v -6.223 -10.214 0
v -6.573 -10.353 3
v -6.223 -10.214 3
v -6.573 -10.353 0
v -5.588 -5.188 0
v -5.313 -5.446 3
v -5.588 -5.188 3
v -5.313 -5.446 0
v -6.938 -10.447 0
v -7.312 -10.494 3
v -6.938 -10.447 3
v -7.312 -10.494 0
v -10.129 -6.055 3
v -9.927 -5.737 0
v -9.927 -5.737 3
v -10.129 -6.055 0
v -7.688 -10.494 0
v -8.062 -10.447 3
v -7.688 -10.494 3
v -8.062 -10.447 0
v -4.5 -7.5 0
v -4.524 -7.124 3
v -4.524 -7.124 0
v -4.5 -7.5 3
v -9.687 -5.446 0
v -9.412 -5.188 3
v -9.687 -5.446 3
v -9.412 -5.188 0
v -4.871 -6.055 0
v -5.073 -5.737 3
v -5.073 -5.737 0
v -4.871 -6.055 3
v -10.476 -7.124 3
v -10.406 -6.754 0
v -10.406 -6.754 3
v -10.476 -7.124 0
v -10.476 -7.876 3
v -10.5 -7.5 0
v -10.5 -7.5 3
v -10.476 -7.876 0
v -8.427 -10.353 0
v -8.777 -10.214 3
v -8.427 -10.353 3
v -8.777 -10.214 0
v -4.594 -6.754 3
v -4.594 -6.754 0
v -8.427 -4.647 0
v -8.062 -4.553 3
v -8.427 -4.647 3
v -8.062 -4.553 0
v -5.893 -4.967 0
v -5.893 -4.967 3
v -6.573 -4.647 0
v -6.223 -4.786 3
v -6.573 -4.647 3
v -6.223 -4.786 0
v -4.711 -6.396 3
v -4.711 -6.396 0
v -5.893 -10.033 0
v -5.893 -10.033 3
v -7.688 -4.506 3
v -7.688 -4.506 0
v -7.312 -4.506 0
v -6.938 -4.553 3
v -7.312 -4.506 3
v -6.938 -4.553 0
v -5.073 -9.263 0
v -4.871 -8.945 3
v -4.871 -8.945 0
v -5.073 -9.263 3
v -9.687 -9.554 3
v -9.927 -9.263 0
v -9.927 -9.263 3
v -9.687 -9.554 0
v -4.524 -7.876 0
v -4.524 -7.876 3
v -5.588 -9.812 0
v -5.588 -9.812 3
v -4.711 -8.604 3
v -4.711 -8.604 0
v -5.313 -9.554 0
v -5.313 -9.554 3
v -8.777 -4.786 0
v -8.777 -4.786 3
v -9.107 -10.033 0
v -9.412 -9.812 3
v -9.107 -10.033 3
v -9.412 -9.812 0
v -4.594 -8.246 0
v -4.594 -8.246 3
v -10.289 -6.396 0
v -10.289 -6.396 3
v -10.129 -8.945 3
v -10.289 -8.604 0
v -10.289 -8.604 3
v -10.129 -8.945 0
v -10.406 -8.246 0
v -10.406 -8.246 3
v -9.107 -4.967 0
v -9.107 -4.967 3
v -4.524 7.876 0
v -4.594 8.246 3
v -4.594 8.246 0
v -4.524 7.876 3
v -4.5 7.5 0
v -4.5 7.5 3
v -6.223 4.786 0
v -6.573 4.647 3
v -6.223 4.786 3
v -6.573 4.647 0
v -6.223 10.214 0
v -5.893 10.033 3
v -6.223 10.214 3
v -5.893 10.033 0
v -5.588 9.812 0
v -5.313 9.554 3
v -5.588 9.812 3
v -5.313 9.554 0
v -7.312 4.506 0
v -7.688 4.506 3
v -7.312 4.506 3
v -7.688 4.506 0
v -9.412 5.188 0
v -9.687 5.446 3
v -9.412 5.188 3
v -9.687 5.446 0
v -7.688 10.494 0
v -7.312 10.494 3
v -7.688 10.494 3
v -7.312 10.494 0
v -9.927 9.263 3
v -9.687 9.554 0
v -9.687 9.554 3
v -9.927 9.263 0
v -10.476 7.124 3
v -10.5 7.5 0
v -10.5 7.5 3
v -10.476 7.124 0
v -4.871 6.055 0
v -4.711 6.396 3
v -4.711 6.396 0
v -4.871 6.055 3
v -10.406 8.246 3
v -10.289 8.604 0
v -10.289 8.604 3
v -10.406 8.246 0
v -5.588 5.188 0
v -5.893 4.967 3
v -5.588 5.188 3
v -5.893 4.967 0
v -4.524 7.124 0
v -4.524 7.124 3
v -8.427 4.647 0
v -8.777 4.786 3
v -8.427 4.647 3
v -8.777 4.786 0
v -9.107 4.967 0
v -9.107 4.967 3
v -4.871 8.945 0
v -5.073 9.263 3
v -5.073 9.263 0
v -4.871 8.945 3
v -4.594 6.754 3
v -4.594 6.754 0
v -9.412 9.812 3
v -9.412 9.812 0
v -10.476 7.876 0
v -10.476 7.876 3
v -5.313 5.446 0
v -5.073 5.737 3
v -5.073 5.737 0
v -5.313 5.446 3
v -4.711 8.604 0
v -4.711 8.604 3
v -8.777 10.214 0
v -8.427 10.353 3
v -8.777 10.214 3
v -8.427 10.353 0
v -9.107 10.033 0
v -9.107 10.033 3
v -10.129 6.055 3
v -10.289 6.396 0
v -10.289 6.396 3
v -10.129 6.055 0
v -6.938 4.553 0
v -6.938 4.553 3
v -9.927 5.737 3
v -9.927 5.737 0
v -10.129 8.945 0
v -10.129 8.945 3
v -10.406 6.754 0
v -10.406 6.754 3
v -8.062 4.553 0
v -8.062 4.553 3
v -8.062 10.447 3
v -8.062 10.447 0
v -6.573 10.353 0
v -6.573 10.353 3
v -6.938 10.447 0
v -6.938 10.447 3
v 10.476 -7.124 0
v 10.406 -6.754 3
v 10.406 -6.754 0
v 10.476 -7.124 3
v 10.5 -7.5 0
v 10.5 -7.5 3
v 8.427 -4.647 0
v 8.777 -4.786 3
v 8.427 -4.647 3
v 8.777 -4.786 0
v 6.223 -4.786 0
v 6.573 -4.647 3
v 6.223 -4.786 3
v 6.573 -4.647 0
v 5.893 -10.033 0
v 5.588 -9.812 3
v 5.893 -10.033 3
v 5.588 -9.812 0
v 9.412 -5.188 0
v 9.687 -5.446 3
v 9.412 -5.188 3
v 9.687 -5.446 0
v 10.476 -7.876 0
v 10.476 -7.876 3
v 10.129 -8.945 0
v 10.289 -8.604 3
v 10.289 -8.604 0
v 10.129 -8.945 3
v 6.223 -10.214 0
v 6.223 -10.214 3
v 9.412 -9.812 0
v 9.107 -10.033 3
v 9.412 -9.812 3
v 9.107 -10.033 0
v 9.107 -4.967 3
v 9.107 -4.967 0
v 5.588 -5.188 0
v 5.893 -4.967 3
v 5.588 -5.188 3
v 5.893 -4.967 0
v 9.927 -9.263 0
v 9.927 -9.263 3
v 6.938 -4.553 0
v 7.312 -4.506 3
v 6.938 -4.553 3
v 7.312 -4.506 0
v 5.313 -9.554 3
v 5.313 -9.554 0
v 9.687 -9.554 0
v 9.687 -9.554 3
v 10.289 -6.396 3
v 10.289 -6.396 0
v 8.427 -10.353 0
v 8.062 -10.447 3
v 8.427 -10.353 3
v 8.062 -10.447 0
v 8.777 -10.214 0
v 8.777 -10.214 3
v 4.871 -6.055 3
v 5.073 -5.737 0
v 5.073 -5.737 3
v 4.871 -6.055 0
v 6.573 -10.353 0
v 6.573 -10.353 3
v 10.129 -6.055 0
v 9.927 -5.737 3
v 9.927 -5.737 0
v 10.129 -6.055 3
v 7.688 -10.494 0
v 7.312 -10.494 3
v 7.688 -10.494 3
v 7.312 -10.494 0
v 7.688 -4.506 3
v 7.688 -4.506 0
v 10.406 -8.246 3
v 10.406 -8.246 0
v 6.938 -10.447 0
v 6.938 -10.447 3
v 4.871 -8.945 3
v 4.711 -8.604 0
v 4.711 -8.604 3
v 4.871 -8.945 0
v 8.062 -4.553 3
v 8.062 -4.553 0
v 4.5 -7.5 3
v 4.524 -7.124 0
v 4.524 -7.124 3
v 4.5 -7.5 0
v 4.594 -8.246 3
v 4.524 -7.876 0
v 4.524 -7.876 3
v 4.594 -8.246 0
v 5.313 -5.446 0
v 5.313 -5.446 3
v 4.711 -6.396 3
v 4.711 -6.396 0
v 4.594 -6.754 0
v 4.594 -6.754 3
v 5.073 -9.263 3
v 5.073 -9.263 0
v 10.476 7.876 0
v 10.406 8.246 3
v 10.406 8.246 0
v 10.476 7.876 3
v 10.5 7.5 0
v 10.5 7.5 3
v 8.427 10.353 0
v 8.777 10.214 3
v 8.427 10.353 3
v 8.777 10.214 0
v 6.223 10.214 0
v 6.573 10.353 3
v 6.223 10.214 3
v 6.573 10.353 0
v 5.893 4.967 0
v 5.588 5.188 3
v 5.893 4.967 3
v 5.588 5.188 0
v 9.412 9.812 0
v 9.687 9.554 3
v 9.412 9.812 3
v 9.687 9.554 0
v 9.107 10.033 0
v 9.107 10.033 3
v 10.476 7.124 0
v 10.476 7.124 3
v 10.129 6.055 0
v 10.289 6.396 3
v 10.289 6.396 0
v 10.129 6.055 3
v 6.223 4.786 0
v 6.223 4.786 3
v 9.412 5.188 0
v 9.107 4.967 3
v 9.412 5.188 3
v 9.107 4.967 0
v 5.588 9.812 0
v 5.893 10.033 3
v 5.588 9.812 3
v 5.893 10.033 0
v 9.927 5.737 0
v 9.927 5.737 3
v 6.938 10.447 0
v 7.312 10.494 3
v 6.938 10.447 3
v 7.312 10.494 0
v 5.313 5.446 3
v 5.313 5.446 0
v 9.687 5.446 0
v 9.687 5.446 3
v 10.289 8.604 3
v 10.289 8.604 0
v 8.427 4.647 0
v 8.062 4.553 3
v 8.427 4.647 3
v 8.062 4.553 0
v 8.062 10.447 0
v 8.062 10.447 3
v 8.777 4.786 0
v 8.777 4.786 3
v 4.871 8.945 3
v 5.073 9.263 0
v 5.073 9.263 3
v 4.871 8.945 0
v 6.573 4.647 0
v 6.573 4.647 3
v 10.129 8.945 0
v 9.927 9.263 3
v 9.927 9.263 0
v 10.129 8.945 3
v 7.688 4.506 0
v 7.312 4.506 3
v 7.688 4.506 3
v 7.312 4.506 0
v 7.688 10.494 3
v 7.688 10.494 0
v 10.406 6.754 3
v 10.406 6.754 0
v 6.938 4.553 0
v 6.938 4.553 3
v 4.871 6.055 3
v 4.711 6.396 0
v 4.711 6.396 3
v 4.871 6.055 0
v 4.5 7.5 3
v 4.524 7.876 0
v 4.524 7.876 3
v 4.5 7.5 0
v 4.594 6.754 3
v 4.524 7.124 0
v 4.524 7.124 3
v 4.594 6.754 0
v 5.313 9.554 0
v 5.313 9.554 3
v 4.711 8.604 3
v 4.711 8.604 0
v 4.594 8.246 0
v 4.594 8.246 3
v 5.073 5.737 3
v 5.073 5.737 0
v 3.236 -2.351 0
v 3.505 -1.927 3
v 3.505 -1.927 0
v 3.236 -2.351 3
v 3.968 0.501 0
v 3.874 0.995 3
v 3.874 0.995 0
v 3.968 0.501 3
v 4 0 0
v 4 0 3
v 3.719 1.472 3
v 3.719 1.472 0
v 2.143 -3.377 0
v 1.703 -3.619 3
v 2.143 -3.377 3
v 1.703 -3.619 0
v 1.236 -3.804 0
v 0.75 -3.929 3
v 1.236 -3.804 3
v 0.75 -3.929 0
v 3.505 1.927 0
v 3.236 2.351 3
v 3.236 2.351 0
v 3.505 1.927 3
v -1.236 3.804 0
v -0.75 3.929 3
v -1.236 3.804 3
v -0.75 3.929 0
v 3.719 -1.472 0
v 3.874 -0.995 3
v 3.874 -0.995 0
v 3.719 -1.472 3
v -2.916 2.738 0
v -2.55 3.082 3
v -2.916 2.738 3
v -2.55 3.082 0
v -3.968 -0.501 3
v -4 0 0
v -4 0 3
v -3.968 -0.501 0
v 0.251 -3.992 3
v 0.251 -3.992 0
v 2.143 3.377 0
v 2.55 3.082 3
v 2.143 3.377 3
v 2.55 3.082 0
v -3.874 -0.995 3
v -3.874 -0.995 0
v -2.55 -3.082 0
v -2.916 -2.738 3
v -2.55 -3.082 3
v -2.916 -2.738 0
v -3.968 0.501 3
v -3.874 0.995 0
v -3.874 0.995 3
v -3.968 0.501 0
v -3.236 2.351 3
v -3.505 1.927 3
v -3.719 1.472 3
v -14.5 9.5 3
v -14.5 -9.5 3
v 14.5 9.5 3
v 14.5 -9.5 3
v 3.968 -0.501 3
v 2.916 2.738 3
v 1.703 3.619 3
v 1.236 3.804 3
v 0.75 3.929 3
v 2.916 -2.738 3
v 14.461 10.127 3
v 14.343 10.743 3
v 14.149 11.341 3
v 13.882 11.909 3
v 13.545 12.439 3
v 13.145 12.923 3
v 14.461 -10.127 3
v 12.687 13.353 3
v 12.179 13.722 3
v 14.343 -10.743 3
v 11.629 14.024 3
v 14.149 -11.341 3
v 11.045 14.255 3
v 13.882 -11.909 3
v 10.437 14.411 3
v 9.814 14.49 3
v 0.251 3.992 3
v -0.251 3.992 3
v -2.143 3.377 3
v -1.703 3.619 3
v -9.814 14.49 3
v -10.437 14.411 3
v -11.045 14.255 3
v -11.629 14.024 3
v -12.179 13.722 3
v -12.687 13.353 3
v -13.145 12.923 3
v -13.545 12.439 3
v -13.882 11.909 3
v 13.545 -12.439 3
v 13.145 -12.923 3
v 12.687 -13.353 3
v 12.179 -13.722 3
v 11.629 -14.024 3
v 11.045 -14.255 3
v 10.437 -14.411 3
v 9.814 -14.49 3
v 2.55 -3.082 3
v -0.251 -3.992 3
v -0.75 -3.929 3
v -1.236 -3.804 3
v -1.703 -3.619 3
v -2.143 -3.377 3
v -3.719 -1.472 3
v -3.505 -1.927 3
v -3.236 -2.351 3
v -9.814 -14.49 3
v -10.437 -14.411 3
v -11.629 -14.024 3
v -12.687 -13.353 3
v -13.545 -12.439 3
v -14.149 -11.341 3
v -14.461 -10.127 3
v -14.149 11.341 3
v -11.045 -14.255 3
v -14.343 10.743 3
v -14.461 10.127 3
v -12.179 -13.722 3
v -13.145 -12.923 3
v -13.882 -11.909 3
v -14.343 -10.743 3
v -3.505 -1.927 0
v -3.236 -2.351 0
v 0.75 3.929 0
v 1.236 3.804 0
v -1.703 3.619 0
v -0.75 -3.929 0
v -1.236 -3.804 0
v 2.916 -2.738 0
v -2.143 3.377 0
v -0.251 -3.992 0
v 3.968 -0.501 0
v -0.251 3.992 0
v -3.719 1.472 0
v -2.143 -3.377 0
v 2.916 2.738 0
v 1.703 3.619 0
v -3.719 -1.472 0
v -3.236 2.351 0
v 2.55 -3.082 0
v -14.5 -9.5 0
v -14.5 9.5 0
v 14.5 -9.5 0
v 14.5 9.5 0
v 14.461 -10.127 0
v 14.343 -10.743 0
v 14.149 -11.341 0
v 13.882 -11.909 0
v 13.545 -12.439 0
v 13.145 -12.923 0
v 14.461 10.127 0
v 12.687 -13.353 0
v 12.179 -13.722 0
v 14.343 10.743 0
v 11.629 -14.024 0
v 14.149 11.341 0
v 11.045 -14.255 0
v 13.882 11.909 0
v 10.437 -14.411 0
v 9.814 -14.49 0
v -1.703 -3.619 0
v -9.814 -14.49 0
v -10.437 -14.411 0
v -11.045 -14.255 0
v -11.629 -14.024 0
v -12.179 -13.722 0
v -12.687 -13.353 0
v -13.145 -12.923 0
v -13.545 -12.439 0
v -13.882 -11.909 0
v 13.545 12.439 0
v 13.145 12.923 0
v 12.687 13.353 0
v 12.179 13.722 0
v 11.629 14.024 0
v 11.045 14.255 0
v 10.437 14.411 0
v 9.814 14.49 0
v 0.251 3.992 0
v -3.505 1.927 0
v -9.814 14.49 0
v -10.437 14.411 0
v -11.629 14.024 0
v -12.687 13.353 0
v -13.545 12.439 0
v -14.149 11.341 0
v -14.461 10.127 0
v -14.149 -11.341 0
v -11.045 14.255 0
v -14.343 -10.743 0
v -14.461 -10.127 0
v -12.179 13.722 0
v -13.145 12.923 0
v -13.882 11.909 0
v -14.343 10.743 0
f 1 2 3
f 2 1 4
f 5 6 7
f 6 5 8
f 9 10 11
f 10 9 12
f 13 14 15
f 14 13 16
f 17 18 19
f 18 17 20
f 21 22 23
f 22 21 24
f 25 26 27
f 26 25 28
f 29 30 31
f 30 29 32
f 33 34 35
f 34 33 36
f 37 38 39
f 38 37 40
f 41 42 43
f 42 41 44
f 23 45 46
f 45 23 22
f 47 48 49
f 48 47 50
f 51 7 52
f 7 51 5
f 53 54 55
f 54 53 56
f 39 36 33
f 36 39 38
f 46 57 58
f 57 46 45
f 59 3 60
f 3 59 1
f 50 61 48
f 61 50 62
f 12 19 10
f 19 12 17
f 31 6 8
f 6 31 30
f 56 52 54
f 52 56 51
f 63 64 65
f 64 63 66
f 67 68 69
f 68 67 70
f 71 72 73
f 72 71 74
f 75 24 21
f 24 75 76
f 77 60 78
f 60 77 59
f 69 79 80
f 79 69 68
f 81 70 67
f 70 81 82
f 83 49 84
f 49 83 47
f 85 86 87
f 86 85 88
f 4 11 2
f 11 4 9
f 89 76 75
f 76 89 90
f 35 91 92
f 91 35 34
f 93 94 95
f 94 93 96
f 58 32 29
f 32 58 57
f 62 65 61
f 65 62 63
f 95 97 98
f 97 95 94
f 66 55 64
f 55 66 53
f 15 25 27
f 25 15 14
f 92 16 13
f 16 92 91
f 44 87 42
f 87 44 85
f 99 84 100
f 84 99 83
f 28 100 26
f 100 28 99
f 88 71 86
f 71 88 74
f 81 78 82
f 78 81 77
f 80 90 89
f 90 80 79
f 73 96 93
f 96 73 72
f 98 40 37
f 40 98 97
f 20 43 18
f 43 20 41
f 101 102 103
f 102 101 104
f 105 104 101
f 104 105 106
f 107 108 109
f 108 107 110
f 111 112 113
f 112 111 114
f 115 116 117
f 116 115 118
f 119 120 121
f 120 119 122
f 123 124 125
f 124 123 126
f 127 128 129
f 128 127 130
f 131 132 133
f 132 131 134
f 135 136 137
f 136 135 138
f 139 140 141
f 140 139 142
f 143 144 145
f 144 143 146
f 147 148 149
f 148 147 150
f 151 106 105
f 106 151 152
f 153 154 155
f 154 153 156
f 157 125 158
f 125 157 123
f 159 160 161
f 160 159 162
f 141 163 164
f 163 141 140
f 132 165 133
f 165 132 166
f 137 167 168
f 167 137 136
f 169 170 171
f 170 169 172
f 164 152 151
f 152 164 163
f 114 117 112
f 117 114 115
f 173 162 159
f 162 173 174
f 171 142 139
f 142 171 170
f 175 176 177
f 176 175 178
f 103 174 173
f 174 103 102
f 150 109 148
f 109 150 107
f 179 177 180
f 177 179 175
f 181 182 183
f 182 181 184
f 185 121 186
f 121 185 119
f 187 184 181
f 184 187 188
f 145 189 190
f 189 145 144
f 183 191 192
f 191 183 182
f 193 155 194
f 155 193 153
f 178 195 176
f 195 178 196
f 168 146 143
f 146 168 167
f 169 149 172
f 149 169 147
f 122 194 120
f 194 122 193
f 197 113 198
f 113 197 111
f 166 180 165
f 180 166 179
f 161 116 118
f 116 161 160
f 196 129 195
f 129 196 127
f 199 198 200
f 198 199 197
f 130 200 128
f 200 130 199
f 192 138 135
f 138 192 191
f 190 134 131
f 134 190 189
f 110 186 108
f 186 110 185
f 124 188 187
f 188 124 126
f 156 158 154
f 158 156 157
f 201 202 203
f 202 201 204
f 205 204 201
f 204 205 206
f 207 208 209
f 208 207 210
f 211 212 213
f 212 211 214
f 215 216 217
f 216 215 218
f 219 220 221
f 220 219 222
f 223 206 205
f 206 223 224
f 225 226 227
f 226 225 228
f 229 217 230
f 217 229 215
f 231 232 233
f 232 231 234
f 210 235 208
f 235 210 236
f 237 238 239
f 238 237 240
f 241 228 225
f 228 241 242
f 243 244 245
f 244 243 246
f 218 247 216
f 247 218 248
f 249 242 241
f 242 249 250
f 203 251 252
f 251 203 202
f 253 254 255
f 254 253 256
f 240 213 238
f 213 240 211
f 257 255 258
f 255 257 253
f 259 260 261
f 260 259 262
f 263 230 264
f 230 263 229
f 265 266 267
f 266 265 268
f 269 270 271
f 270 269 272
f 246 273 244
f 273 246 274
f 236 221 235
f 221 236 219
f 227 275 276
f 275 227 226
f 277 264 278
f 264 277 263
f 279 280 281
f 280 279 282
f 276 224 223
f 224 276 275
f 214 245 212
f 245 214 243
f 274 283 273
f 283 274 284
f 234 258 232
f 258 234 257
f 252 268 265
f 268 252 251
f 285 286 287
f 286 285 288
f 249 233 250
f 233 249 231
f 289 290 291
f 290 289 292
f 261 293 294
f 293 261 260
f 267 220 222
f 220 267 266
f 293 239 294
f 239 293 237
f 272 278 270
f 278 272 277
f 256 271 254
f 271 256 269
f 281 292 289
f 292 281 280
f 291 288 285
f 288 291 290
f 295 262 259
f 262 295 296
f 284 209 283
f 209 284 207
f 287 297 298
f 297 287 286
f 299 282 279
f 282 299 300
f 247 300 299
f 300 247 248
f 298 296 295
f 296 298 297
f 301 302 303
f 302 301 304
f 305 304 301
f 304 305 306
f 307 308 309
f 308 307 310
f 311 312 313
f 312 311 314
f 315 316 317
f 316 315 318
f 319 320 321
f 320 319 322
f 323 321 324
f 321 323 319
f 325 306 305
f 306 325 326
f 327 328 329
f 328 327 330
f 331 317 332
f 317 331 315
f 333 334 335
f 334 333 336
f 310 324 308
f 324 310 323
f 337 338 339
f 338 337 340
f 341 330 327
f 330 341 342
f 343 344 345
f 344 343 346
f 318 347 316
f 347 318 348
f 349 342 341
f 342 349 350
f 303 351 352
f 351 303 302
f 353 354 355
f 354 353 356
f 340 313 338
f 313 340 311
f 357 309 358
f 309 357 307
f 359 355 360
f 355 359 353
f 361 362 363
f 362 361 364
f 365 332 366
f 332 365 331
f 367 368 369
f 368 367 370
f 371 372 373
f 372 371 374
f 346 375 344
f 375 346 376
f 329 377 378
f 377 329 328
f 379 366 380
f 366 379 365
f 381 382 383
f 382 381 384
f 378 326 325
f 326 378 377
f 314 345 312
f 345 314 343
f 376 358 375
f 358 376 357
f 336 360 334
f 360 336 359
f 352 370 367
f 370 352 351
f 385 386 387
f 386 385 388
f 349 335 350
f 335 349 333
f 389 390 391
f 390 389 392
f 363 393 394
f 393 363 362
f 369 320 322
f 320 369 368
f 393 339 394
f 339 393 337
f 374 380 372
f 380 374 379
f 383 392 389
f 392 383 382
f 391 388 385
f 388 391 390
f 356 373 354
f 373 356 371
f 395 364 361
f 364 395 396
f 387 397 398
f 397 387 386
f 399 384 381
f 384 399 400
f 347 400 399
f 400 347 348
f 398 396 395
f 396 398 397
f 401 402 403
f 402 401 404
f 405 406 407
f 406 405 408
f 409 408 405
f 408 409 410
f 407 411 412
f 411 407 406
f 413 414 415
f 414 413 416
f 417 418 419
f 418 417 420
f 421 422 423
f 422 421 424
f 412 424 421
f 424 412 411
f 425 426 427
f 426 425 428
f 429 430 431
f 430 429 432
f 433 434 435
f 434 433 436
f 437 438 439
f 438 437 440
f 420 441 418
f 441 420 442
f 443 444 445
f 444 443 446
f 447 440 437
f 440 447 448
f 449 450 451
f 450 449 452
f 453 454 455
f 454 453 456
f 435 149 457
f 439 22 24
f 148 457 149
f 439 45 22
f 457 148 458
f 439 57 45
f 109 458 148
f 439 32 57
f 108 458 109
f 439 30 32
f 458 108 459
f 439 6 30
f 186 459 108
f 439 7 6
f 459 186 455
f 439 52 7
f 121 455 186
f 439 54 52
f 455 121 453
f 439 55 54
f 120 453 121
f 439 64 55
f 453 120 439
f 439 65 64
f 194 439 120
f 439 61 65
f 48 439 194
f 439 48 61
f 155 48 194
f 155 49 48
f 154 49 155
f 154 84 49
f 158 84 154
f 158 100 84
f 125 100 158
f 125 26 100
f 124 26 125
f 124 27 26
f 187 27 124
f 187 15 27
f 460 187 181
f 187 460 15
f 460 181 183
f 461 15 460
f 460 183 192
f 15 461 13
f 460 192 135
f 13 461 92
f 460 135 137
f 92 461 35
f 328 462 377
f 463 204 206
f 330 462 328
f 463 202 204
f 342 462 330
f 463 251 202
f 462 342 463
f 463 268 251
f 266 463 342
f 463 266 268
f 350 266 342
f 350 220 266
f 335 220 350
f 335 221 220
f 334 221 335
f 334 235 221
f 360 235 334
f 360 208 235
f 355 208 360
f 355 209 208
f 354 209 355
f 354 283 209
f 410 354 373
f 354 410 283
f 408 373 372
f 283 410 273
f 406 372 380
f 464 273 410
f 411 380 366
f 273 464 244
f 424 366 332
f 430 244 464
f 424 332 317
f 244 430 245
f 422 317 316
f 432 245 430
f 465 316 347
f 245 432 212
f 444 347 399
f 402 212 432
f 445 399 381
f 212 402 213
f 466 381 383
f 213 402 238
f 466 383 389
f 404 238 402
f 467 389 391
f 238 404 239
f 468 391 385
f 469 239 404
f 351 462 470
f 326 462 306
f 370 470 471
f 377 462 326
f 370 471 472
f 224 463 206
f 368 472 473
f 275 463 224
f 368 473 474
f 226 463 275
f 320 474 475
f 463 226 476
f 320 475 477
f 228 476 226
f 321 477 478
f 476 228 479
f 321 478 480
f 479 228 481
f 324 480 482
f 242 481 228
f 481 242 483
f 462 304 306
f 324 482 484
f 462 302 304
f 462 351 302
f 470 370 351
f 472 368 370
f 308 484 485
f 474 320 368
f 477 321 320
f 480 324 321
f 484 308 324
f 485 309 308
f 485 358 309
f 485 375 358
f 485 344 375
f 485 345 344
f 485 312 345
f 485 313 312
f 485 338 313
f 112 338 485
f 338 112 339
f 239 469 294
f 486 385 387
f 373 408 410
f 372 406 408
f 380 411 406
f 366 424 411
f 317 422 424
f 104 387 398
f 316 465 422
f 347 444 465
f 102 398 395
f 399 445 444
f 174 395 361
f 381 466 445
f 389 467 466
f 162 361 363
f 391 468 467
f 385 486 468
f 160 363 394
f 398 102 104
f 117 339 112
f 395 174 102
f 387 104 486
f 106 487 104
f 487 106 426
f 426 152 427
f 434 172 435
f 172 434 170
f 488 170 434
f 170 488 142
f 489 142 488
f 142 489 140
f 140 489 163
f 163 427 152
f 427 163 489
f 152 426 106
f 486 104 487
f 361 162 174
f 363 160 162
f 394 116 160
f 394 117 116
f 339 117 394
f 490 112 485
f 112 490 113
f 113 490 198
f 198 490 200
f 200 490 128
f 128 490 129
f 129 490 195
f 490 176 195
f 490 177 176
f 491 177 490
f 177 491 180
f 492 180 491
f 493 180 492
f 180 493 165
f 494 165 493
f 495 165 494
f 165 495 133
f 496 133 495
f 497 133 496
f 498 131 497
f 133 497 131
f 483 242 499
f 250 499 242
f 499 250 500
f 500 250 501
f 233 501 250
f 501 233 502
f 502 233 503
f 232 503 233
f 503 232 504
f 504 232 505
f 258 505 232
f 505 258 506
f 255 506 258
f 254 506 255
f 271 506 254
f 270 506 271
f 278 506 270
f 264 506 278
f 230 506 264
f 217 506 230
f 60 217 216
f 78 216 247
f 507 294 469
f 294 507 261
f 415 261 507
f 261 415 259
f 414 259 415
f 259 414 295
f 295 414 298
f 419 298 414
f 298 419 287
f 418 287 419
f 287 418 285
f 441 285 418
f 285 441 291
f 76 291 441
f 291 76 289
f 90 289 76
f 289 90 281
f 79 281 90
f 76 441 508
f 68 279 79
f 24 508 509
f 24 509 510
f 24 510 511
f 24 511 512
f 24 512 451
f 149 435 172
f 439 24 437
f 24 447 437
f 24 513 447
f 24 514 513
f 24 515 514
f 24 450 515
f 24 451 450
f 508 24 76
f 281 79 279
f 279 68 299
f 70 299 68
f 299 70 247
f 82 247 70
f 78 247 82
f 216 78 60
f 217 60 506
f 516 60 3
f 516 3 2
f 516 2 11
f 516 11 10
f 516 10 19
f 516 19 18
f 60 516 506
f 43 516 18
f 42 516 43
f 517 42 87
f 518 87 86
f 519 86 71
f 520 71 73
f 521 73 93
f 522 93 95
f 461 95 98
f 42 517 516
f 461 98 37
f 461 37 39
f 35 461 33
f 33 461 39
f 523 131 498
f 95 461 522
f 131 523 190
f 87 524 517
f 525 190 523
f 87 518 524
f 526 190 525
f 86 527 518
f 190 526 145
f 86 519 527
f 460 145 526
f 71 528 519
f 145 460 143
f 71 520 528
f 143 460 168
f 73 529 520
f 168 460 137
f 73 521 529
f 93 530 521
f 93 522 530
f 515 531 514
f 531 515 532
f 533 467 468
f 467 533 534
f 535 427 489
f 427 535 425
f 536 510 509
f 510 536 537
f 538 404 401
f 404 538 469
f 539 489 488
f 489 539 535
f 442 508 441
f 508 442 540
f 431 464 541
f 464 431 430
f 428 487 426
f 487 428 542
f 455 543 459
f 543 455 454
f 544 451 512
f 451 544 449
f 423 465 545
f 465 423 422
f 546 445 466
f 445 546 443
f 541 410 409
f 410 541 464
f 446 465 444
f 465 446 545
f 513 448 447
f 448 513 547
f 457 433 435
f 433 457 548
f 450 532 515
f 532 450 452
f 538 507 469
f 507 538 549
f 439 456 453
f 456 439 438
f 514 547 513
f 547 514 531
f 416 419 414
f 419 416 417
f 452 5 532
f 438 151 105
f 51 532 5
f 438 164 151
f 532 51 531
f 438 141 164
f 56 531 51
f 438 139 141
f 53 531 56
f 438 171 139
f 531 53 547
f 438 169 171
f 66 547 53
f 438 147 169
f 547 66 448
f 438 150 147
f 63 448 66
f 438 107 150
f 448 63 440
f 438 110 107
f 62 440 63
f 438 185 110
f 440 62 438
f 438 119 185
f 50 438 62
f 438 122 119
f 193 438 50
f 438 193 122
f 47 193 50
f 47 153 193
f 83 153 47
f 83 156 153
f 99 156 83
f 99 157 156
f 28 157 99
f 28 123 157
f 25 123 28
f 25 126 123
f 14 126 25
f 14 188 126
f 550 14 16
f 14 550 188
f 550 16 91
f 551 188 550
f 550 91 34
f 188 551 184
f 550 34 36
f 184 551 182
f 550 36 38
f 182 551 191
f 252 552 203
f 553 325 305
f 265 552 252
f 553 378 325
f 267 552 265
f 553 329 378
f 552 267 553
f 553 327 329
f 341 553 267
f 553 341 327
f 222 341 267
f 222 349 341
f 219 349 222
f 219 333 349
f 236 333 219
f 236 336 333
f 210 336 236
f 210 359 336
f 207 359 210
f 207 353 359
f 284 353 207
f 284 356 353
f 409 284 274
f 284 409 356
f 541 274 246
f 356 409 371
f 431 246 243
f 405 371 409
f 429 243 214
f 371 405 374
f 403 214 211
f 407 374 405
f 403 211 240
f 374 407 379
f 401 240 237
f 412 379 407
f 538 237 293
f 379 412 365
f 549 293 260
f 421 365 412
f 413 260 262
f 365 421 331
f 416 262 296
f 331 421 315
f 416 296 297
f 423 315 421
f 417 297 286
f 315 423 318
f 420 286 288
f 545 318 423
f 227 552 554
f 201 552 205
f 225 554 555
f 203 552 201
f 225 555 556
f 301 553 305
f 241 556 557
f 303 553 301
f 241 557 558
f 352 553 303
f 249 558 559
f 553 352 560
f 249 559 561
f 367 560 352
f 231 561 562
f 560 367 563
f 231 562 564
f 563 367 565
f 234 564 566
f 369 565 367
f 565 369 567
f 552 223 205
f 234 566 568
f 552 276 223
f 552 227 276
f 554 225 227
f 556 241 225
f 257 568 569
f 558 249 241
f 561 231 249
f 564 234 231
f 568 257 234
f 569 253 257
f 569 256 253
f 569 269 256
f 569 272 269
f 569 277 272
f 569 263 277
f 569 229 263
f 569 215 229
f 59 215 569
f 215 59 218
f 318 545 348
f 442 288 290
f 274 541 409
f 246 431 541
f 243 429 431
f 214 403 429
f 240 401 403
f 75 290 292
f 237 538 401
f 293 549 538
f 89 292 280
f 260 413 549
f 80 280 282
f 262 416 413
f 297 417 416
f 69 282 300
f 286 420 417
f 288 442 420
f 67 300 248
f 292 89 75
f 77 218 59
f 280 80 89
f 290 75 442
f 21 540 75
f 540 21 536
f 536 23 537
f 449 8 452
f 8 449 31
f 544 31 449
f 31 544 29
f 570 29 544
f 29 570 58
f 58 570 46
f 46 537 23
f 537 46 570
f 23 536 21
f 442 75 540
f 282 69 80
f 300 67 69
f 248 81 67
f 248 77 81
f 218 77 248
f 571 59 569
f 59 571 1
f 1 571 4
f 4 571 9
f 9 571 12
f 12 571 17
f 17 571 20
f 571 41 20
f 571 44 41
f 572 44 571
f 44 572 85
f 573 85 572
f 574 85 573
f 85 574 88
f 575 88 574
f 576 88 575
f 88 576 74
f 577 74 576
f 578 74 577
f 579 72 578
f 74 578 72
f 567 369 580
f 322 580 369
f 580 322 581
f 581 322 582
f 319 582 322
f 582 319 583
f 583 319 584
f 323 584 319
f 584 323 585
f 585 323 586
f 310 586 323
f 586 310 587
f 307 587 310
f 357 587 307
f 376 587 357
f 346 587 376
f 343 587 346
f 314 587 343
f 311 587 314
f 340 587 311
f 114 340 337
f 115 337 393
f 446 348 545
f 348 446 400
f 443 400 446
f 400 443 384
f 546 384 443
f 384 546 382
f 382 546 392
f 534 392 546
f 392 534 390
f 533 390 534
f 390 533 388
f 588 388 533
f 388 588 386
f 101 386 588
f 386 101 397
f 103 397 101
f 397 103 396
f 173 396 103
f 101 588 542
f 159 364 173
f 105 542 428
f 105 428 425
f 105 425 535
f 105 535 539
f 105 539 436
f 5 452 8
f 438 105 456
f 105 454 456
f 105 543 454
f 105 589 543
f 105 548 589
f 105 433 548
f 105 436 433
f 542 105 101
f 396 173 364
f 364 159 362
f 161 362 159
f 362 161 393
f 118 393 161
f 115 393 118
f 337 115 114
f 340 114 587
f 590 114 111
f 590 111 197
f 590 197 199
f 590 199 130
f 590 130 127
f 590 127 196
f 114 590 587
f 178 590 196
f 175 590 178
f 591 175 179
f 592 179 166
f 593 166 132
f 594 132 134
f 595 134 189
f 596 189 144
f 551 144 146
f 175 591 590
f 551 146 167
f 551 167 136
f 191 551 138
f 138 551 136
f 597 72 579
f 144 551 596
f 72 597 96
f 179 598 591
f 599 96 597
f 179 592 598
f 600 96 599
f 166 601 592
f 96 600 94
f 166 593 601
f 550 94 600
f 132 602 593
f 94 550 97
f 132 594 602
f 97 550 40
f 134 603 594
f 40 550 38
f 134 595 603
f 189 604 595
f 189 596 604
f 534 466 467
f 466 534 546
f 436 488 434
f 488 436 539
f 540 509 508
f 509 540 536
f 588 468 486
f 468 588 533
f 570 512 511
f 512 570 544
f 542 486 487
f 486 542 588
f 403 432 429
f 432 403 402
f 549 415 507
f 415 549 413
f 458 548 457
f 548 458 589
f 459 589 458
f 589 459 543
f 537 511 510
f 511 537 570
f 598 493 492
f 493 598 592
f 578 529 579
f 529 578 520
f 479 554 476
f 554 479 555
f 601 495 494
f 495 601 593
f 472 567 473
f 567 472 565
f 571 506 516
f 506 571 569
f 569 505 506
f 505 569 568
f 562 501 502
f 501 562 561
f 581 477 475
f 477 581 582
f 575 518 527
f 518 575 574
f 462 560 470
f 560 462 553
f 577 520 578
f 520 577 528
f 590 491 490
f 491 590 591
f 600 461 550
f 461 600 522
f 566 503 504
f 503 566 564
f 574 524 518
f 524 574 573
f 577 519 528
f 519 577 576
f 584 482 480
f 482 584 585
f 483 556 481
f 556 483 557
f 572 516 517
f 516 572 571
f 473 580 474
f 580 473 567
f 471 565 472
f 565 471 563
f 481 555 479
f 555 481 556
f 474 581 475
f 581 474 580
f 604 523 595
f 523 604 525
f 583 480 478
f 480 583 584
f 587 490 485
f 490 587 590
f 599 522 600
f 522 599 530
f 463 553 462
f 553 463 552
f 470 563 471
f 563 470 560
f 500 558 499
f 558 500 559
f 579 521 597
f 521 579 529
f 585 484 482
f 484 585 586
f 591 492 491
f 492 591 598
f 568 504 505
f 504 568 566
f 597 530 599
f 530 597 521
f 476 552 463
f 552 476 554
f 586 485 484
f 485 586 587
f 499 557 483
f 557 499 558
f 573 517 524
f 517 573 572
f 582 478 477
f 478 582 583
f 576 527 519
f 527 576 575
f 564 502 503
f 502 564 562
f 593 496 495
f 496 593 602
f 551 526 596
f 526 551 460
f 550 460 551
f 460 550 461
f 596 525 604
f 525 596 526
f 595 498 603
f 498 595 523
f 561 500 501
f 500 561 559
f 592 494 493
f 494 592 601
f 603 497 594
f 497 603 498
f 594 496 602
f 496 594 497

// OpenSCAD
$fn = 50;


difference() {
	union() {
		hull() {
			translate(v = [-9.5000000000, 9.5000000000, 0]) {
				cylinder(h = 3, r = 5);
			}
			translate(v = [9.5000000000, 9.5000000000, 0]) {
				cylinder(h = 3, r = 5);
			}
			translate(v = [-9.5000000000, -9.5000000000, 0]) {
				cylinder(h = 3, r = 5);
			}
			translate(v = [9.5000000000, -9.5000000000, 0]) {
				cylinder(h = 3, r = 5);
			}
		}
	}
	union() {
		#translate(v = [-7.5000000000, -7.5000000000, -100.0000000000]) {
			cylinder(h = 200, r = 3.0000000000);
		}
		#translate(v = [-7.5000000000, 7.5000000000, -100.0000000000]) {
			cylinder(h = 200, r = 3.0000000000);
		}
		#translate(v = [7.5000000000, -7.5000000000, -100.0000000000]) {
			cylinder(h = 200, r = 3.0000000000);
		}
		#translate(v = [7.5000000000, 7.5000000000, -100.0000000000]) {
			cylinder(h = 200, r = 3.0000000000);
		}
		#cylinder(h = 3, r = 4.0000000000);
	}
}
